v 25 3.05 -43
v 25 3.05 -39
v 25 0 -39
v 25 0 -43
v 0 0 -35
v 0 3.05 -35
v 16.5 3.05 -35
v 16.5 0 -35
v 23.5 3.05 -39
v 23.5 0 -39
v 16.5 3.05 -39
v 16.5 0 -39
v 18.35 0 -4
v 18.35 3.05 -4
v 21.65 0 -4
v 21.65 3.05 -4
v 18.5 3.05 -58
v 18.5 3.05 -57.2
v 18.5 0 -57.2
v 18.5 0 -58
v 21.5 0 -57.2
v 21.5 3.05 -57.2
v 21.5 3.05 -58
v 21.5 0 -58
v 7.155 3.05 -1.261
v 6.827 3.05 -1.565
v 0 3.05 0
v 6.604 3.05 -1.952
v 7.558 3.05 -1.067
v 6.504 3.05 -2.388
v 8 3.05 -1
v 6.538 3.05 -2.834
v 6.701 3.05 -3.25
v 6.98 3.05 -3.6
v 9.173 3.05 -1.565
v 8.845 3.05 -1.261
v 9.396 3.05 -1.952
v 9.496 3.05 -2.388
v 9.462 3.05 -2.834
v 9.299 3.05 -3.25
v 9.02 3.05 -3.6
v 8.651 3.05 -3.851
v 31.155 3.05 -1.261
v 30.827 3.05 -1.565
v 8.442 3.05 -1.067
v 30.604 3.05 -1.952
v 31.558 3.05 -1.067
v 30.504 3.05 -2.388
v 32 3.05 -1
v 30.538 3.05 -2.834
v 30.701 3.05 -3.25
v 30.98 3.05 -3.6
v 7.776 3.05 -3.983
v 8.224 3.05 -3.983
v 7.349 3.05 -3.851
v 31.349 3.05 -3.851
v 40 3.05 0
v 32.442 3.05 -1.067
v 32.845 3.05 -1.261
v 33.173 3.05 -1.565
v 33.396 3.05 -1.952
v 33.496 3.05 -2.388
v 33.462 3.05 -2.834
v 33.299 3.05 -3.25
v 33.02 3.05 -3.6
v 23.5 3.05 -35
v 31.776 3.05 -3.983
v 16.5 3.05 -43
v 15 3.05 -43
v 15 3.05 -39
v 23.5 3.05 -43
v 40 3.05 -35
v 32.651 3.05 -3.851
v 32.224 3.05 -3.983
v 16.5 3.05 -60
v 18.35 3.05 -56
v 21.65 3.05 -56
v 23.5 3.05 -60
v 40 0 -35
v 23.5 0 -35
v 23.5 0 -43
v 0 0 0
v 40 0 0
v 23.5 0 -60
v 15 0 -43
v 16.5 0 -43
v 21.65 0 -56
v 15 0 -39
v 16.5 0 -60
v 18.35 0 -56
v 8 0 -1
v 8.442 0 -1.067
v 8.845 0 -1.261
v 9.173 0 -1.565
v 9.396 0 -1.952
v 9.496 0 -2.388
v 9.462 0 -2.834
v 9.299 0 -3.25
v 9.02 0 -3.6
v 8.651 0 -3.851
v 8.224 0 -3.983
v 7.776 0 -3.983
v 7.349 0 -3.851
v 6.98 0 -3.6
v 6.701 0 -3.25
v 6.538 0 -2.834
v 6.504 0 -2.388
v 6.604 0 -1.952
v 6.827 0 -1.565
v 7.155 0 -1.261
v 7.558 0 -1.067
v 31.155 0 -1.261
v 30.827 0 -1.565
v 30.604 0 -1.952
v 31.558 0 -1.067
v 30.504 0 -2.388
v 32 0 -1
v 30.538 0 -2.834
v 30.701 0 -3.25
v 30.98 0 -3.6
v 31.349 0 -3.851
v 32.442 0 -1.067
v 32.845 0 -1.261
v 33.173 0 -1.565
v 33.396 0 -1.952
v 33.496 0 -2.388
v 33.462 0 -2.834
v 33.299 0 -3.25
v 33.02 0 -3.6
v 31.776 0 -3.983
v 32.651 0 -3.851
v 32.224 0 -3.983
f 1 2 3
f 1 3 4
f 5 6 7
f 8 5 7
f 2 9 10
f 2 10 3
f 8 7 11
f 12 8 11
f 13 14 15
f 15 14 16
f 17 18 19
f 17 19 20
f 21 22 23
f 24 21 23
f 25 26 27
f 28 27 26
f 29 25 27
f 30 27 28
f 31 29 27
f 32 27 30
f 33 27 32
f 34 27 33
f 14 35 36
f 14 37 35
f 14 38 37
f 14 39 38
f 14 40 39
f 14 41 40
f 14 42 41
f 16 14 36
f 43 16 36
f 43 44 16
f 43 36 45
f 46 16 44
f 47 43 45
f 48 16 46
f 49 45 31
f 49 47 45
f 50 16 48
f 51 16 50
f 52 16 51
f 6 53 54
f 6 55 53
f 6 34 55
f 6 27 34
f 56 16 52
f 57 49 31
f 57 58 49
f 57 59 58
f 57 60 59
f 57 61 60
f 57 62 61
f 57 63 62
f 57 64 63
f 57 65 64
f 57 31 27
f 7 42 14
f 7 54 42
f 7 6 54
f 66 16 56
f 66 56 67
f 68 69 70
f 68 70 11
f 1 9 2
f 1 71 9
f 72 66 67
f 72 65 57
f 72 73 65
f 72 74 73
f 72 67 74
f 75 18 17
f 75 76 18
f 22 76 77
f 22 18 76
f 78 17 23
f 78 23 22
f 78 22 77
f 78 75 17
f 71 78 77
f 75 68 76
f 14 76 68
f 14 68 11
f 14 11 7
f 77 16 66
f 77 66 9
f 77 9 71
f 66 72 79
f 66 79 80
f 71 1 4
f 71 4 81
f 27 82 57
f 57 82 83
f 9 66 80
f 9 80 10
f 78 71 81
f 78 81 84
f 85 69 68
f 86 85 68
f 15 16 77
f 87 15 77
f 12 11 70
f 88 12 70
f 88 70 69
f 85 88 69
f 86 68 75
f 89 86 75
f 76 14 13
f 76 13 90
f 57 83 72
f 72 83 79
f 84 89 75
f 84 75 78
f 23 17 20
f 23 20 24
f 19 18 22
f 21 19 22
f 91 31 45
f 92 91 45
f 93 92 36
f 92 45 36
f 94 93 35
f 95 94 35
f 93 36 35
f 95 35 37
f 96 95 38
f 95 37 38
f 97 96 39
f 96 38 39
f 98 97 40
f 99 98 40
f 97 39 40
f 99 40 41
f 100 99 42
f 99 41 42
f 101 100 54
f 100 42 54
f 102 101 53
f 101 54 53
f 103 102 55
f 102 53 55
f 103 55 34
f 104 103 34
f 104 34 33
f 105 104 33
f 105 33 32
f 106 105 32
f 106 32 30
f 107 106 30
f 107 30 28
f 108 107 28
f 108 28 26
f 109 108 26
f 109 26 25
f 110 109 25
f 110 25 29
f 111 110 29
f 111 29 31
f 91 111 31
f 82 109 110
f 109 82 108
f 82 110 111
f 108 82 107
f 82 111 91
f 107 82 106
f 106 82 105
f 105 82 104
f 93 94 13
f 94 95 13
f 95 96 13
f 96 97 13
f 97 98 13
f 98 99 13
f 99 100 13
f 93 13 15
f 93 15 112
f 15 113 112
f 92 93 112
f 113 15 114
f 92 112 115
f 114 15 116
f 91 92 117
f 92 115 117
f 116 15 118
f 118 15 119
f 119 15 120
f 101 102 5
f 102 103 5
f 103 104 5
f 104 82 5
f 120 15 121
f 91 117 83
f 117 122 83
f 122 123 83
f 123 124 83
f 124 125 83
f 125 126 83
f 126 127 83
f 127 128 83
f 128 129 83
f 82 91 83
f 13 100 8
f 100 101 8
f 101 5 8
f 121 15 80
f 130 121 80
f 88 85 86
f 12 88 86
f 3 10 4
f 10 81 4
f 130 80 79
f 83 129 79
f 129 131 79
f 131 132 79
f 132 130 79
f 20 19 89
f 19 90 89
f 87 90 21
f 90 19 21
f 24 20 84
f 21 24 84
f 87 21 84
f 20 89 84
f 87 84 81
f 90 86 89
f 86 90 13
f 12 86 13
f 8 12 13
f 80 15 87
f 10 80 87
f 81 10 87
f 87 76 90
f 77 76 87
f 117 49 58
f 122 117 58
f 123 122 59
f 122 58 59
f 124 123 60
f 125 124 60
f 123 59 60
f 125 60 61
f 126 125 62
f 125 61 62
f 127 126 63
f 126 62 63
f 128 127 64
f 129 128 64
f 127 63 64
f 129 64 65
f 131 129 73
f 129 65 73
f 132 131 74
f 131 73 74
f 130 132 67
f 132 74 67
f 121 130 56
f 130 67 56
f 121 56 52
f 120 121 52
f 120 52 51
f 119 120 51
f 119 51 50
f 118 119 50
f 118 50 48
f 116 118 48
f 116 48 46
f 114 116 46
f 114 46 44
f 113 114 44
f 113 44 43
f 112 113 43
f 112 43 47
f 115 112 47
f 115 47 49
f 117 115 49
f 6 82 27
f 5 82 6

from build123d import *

# Parameters (mm, degrees)
SKETCH1_W           = 40
SKETCH1_H           = 60
BOSS_EXTRUDE1_DEPTH = 3.05
SKETCH4_W           = 3.3
SKETCH4_H           = 52
SKETCH4_W_2         = 3
SKETCH4_H_2         = 0.8
CUT_EXTRUDE1_DEPTH  = 10
CUT_EXTRUDE3_DEPTH  = 10
SKETCH7_R           = 1.5
CUT_EXTRUDE4_DEPTH  = 10


with BuildPart() as part:
    # Sketch1 → Boss-Extrude1 (new body)
    with BuildSketch(Plane(origin=(0, 0, 0), x_dir=(1, 0, 0), z_dir=(0, 1, 0))):
        with Locations((20, 30)):
            Rectangle(SKETCH1_W, SKETCH1_H)
    extrude(amount=BOSS_EXTRUDE1_DEPTH)

    # Sketch4 → Cut-Extrude1 (cut)
    with BuildSketch(Plane(origin=(0, 3.05, 0), x_dir=(1, 0, 0), z_dir=(0, 1, 0))):
        with Locations((20, 30)):
            Rectangle(SKETCH4_W, SKETCH4_H)
        with Locations((20, 57.6)):
            Rectangle(SKETCH4_W_2, SKETCH4_H_2)
    extrude(amount=-CUT_EXTRUDE1_DEPTH, mode=Mode.SUBTRACT)

    # Sketch6 → Cut-Extrude3 (cut)
    with BuildSketch(Plane(origin=(0, 3.05, 0), x_dir=(1, 0, 0), z_dir=(0, 1, 0))):
        Polygon((0, 60), (0, 35), (16.5, 35), (16.5, 39), (15, 39), (15, 43), (16.5, 43), (16.5, 60), align=None)
        Polygon((40, 60), (40, 35), (23.5, 35), (23.5, 39), (25, 39), (25, 43), (23.5, 43), (23.5, 60), align=None)
    extrude(amount=-CUT_EXTRUDE3_DEPTH, mode=Mode.SUBTRACT)

    # Sketch7 → Cut-Extrude4 (cut)
    with BuildSketch(Plane(origin=(0, 3.05, 0), x_dir=(1, 0, 0), z_dir=(0, 1, 0))):
        with Locations(Location((8, 2.5, 0), (0, 0, 270))):
            Circle(SKETCH7_R)
        with Locations(Location((32, 2.5, 0), (0, 0, 270))):
            Circle(SKETCH7_R)
    extrude(amount=-CUT_EXTRUDE4_DEPTH, mode=Mode.SUBTRACT)


solid = part.part
